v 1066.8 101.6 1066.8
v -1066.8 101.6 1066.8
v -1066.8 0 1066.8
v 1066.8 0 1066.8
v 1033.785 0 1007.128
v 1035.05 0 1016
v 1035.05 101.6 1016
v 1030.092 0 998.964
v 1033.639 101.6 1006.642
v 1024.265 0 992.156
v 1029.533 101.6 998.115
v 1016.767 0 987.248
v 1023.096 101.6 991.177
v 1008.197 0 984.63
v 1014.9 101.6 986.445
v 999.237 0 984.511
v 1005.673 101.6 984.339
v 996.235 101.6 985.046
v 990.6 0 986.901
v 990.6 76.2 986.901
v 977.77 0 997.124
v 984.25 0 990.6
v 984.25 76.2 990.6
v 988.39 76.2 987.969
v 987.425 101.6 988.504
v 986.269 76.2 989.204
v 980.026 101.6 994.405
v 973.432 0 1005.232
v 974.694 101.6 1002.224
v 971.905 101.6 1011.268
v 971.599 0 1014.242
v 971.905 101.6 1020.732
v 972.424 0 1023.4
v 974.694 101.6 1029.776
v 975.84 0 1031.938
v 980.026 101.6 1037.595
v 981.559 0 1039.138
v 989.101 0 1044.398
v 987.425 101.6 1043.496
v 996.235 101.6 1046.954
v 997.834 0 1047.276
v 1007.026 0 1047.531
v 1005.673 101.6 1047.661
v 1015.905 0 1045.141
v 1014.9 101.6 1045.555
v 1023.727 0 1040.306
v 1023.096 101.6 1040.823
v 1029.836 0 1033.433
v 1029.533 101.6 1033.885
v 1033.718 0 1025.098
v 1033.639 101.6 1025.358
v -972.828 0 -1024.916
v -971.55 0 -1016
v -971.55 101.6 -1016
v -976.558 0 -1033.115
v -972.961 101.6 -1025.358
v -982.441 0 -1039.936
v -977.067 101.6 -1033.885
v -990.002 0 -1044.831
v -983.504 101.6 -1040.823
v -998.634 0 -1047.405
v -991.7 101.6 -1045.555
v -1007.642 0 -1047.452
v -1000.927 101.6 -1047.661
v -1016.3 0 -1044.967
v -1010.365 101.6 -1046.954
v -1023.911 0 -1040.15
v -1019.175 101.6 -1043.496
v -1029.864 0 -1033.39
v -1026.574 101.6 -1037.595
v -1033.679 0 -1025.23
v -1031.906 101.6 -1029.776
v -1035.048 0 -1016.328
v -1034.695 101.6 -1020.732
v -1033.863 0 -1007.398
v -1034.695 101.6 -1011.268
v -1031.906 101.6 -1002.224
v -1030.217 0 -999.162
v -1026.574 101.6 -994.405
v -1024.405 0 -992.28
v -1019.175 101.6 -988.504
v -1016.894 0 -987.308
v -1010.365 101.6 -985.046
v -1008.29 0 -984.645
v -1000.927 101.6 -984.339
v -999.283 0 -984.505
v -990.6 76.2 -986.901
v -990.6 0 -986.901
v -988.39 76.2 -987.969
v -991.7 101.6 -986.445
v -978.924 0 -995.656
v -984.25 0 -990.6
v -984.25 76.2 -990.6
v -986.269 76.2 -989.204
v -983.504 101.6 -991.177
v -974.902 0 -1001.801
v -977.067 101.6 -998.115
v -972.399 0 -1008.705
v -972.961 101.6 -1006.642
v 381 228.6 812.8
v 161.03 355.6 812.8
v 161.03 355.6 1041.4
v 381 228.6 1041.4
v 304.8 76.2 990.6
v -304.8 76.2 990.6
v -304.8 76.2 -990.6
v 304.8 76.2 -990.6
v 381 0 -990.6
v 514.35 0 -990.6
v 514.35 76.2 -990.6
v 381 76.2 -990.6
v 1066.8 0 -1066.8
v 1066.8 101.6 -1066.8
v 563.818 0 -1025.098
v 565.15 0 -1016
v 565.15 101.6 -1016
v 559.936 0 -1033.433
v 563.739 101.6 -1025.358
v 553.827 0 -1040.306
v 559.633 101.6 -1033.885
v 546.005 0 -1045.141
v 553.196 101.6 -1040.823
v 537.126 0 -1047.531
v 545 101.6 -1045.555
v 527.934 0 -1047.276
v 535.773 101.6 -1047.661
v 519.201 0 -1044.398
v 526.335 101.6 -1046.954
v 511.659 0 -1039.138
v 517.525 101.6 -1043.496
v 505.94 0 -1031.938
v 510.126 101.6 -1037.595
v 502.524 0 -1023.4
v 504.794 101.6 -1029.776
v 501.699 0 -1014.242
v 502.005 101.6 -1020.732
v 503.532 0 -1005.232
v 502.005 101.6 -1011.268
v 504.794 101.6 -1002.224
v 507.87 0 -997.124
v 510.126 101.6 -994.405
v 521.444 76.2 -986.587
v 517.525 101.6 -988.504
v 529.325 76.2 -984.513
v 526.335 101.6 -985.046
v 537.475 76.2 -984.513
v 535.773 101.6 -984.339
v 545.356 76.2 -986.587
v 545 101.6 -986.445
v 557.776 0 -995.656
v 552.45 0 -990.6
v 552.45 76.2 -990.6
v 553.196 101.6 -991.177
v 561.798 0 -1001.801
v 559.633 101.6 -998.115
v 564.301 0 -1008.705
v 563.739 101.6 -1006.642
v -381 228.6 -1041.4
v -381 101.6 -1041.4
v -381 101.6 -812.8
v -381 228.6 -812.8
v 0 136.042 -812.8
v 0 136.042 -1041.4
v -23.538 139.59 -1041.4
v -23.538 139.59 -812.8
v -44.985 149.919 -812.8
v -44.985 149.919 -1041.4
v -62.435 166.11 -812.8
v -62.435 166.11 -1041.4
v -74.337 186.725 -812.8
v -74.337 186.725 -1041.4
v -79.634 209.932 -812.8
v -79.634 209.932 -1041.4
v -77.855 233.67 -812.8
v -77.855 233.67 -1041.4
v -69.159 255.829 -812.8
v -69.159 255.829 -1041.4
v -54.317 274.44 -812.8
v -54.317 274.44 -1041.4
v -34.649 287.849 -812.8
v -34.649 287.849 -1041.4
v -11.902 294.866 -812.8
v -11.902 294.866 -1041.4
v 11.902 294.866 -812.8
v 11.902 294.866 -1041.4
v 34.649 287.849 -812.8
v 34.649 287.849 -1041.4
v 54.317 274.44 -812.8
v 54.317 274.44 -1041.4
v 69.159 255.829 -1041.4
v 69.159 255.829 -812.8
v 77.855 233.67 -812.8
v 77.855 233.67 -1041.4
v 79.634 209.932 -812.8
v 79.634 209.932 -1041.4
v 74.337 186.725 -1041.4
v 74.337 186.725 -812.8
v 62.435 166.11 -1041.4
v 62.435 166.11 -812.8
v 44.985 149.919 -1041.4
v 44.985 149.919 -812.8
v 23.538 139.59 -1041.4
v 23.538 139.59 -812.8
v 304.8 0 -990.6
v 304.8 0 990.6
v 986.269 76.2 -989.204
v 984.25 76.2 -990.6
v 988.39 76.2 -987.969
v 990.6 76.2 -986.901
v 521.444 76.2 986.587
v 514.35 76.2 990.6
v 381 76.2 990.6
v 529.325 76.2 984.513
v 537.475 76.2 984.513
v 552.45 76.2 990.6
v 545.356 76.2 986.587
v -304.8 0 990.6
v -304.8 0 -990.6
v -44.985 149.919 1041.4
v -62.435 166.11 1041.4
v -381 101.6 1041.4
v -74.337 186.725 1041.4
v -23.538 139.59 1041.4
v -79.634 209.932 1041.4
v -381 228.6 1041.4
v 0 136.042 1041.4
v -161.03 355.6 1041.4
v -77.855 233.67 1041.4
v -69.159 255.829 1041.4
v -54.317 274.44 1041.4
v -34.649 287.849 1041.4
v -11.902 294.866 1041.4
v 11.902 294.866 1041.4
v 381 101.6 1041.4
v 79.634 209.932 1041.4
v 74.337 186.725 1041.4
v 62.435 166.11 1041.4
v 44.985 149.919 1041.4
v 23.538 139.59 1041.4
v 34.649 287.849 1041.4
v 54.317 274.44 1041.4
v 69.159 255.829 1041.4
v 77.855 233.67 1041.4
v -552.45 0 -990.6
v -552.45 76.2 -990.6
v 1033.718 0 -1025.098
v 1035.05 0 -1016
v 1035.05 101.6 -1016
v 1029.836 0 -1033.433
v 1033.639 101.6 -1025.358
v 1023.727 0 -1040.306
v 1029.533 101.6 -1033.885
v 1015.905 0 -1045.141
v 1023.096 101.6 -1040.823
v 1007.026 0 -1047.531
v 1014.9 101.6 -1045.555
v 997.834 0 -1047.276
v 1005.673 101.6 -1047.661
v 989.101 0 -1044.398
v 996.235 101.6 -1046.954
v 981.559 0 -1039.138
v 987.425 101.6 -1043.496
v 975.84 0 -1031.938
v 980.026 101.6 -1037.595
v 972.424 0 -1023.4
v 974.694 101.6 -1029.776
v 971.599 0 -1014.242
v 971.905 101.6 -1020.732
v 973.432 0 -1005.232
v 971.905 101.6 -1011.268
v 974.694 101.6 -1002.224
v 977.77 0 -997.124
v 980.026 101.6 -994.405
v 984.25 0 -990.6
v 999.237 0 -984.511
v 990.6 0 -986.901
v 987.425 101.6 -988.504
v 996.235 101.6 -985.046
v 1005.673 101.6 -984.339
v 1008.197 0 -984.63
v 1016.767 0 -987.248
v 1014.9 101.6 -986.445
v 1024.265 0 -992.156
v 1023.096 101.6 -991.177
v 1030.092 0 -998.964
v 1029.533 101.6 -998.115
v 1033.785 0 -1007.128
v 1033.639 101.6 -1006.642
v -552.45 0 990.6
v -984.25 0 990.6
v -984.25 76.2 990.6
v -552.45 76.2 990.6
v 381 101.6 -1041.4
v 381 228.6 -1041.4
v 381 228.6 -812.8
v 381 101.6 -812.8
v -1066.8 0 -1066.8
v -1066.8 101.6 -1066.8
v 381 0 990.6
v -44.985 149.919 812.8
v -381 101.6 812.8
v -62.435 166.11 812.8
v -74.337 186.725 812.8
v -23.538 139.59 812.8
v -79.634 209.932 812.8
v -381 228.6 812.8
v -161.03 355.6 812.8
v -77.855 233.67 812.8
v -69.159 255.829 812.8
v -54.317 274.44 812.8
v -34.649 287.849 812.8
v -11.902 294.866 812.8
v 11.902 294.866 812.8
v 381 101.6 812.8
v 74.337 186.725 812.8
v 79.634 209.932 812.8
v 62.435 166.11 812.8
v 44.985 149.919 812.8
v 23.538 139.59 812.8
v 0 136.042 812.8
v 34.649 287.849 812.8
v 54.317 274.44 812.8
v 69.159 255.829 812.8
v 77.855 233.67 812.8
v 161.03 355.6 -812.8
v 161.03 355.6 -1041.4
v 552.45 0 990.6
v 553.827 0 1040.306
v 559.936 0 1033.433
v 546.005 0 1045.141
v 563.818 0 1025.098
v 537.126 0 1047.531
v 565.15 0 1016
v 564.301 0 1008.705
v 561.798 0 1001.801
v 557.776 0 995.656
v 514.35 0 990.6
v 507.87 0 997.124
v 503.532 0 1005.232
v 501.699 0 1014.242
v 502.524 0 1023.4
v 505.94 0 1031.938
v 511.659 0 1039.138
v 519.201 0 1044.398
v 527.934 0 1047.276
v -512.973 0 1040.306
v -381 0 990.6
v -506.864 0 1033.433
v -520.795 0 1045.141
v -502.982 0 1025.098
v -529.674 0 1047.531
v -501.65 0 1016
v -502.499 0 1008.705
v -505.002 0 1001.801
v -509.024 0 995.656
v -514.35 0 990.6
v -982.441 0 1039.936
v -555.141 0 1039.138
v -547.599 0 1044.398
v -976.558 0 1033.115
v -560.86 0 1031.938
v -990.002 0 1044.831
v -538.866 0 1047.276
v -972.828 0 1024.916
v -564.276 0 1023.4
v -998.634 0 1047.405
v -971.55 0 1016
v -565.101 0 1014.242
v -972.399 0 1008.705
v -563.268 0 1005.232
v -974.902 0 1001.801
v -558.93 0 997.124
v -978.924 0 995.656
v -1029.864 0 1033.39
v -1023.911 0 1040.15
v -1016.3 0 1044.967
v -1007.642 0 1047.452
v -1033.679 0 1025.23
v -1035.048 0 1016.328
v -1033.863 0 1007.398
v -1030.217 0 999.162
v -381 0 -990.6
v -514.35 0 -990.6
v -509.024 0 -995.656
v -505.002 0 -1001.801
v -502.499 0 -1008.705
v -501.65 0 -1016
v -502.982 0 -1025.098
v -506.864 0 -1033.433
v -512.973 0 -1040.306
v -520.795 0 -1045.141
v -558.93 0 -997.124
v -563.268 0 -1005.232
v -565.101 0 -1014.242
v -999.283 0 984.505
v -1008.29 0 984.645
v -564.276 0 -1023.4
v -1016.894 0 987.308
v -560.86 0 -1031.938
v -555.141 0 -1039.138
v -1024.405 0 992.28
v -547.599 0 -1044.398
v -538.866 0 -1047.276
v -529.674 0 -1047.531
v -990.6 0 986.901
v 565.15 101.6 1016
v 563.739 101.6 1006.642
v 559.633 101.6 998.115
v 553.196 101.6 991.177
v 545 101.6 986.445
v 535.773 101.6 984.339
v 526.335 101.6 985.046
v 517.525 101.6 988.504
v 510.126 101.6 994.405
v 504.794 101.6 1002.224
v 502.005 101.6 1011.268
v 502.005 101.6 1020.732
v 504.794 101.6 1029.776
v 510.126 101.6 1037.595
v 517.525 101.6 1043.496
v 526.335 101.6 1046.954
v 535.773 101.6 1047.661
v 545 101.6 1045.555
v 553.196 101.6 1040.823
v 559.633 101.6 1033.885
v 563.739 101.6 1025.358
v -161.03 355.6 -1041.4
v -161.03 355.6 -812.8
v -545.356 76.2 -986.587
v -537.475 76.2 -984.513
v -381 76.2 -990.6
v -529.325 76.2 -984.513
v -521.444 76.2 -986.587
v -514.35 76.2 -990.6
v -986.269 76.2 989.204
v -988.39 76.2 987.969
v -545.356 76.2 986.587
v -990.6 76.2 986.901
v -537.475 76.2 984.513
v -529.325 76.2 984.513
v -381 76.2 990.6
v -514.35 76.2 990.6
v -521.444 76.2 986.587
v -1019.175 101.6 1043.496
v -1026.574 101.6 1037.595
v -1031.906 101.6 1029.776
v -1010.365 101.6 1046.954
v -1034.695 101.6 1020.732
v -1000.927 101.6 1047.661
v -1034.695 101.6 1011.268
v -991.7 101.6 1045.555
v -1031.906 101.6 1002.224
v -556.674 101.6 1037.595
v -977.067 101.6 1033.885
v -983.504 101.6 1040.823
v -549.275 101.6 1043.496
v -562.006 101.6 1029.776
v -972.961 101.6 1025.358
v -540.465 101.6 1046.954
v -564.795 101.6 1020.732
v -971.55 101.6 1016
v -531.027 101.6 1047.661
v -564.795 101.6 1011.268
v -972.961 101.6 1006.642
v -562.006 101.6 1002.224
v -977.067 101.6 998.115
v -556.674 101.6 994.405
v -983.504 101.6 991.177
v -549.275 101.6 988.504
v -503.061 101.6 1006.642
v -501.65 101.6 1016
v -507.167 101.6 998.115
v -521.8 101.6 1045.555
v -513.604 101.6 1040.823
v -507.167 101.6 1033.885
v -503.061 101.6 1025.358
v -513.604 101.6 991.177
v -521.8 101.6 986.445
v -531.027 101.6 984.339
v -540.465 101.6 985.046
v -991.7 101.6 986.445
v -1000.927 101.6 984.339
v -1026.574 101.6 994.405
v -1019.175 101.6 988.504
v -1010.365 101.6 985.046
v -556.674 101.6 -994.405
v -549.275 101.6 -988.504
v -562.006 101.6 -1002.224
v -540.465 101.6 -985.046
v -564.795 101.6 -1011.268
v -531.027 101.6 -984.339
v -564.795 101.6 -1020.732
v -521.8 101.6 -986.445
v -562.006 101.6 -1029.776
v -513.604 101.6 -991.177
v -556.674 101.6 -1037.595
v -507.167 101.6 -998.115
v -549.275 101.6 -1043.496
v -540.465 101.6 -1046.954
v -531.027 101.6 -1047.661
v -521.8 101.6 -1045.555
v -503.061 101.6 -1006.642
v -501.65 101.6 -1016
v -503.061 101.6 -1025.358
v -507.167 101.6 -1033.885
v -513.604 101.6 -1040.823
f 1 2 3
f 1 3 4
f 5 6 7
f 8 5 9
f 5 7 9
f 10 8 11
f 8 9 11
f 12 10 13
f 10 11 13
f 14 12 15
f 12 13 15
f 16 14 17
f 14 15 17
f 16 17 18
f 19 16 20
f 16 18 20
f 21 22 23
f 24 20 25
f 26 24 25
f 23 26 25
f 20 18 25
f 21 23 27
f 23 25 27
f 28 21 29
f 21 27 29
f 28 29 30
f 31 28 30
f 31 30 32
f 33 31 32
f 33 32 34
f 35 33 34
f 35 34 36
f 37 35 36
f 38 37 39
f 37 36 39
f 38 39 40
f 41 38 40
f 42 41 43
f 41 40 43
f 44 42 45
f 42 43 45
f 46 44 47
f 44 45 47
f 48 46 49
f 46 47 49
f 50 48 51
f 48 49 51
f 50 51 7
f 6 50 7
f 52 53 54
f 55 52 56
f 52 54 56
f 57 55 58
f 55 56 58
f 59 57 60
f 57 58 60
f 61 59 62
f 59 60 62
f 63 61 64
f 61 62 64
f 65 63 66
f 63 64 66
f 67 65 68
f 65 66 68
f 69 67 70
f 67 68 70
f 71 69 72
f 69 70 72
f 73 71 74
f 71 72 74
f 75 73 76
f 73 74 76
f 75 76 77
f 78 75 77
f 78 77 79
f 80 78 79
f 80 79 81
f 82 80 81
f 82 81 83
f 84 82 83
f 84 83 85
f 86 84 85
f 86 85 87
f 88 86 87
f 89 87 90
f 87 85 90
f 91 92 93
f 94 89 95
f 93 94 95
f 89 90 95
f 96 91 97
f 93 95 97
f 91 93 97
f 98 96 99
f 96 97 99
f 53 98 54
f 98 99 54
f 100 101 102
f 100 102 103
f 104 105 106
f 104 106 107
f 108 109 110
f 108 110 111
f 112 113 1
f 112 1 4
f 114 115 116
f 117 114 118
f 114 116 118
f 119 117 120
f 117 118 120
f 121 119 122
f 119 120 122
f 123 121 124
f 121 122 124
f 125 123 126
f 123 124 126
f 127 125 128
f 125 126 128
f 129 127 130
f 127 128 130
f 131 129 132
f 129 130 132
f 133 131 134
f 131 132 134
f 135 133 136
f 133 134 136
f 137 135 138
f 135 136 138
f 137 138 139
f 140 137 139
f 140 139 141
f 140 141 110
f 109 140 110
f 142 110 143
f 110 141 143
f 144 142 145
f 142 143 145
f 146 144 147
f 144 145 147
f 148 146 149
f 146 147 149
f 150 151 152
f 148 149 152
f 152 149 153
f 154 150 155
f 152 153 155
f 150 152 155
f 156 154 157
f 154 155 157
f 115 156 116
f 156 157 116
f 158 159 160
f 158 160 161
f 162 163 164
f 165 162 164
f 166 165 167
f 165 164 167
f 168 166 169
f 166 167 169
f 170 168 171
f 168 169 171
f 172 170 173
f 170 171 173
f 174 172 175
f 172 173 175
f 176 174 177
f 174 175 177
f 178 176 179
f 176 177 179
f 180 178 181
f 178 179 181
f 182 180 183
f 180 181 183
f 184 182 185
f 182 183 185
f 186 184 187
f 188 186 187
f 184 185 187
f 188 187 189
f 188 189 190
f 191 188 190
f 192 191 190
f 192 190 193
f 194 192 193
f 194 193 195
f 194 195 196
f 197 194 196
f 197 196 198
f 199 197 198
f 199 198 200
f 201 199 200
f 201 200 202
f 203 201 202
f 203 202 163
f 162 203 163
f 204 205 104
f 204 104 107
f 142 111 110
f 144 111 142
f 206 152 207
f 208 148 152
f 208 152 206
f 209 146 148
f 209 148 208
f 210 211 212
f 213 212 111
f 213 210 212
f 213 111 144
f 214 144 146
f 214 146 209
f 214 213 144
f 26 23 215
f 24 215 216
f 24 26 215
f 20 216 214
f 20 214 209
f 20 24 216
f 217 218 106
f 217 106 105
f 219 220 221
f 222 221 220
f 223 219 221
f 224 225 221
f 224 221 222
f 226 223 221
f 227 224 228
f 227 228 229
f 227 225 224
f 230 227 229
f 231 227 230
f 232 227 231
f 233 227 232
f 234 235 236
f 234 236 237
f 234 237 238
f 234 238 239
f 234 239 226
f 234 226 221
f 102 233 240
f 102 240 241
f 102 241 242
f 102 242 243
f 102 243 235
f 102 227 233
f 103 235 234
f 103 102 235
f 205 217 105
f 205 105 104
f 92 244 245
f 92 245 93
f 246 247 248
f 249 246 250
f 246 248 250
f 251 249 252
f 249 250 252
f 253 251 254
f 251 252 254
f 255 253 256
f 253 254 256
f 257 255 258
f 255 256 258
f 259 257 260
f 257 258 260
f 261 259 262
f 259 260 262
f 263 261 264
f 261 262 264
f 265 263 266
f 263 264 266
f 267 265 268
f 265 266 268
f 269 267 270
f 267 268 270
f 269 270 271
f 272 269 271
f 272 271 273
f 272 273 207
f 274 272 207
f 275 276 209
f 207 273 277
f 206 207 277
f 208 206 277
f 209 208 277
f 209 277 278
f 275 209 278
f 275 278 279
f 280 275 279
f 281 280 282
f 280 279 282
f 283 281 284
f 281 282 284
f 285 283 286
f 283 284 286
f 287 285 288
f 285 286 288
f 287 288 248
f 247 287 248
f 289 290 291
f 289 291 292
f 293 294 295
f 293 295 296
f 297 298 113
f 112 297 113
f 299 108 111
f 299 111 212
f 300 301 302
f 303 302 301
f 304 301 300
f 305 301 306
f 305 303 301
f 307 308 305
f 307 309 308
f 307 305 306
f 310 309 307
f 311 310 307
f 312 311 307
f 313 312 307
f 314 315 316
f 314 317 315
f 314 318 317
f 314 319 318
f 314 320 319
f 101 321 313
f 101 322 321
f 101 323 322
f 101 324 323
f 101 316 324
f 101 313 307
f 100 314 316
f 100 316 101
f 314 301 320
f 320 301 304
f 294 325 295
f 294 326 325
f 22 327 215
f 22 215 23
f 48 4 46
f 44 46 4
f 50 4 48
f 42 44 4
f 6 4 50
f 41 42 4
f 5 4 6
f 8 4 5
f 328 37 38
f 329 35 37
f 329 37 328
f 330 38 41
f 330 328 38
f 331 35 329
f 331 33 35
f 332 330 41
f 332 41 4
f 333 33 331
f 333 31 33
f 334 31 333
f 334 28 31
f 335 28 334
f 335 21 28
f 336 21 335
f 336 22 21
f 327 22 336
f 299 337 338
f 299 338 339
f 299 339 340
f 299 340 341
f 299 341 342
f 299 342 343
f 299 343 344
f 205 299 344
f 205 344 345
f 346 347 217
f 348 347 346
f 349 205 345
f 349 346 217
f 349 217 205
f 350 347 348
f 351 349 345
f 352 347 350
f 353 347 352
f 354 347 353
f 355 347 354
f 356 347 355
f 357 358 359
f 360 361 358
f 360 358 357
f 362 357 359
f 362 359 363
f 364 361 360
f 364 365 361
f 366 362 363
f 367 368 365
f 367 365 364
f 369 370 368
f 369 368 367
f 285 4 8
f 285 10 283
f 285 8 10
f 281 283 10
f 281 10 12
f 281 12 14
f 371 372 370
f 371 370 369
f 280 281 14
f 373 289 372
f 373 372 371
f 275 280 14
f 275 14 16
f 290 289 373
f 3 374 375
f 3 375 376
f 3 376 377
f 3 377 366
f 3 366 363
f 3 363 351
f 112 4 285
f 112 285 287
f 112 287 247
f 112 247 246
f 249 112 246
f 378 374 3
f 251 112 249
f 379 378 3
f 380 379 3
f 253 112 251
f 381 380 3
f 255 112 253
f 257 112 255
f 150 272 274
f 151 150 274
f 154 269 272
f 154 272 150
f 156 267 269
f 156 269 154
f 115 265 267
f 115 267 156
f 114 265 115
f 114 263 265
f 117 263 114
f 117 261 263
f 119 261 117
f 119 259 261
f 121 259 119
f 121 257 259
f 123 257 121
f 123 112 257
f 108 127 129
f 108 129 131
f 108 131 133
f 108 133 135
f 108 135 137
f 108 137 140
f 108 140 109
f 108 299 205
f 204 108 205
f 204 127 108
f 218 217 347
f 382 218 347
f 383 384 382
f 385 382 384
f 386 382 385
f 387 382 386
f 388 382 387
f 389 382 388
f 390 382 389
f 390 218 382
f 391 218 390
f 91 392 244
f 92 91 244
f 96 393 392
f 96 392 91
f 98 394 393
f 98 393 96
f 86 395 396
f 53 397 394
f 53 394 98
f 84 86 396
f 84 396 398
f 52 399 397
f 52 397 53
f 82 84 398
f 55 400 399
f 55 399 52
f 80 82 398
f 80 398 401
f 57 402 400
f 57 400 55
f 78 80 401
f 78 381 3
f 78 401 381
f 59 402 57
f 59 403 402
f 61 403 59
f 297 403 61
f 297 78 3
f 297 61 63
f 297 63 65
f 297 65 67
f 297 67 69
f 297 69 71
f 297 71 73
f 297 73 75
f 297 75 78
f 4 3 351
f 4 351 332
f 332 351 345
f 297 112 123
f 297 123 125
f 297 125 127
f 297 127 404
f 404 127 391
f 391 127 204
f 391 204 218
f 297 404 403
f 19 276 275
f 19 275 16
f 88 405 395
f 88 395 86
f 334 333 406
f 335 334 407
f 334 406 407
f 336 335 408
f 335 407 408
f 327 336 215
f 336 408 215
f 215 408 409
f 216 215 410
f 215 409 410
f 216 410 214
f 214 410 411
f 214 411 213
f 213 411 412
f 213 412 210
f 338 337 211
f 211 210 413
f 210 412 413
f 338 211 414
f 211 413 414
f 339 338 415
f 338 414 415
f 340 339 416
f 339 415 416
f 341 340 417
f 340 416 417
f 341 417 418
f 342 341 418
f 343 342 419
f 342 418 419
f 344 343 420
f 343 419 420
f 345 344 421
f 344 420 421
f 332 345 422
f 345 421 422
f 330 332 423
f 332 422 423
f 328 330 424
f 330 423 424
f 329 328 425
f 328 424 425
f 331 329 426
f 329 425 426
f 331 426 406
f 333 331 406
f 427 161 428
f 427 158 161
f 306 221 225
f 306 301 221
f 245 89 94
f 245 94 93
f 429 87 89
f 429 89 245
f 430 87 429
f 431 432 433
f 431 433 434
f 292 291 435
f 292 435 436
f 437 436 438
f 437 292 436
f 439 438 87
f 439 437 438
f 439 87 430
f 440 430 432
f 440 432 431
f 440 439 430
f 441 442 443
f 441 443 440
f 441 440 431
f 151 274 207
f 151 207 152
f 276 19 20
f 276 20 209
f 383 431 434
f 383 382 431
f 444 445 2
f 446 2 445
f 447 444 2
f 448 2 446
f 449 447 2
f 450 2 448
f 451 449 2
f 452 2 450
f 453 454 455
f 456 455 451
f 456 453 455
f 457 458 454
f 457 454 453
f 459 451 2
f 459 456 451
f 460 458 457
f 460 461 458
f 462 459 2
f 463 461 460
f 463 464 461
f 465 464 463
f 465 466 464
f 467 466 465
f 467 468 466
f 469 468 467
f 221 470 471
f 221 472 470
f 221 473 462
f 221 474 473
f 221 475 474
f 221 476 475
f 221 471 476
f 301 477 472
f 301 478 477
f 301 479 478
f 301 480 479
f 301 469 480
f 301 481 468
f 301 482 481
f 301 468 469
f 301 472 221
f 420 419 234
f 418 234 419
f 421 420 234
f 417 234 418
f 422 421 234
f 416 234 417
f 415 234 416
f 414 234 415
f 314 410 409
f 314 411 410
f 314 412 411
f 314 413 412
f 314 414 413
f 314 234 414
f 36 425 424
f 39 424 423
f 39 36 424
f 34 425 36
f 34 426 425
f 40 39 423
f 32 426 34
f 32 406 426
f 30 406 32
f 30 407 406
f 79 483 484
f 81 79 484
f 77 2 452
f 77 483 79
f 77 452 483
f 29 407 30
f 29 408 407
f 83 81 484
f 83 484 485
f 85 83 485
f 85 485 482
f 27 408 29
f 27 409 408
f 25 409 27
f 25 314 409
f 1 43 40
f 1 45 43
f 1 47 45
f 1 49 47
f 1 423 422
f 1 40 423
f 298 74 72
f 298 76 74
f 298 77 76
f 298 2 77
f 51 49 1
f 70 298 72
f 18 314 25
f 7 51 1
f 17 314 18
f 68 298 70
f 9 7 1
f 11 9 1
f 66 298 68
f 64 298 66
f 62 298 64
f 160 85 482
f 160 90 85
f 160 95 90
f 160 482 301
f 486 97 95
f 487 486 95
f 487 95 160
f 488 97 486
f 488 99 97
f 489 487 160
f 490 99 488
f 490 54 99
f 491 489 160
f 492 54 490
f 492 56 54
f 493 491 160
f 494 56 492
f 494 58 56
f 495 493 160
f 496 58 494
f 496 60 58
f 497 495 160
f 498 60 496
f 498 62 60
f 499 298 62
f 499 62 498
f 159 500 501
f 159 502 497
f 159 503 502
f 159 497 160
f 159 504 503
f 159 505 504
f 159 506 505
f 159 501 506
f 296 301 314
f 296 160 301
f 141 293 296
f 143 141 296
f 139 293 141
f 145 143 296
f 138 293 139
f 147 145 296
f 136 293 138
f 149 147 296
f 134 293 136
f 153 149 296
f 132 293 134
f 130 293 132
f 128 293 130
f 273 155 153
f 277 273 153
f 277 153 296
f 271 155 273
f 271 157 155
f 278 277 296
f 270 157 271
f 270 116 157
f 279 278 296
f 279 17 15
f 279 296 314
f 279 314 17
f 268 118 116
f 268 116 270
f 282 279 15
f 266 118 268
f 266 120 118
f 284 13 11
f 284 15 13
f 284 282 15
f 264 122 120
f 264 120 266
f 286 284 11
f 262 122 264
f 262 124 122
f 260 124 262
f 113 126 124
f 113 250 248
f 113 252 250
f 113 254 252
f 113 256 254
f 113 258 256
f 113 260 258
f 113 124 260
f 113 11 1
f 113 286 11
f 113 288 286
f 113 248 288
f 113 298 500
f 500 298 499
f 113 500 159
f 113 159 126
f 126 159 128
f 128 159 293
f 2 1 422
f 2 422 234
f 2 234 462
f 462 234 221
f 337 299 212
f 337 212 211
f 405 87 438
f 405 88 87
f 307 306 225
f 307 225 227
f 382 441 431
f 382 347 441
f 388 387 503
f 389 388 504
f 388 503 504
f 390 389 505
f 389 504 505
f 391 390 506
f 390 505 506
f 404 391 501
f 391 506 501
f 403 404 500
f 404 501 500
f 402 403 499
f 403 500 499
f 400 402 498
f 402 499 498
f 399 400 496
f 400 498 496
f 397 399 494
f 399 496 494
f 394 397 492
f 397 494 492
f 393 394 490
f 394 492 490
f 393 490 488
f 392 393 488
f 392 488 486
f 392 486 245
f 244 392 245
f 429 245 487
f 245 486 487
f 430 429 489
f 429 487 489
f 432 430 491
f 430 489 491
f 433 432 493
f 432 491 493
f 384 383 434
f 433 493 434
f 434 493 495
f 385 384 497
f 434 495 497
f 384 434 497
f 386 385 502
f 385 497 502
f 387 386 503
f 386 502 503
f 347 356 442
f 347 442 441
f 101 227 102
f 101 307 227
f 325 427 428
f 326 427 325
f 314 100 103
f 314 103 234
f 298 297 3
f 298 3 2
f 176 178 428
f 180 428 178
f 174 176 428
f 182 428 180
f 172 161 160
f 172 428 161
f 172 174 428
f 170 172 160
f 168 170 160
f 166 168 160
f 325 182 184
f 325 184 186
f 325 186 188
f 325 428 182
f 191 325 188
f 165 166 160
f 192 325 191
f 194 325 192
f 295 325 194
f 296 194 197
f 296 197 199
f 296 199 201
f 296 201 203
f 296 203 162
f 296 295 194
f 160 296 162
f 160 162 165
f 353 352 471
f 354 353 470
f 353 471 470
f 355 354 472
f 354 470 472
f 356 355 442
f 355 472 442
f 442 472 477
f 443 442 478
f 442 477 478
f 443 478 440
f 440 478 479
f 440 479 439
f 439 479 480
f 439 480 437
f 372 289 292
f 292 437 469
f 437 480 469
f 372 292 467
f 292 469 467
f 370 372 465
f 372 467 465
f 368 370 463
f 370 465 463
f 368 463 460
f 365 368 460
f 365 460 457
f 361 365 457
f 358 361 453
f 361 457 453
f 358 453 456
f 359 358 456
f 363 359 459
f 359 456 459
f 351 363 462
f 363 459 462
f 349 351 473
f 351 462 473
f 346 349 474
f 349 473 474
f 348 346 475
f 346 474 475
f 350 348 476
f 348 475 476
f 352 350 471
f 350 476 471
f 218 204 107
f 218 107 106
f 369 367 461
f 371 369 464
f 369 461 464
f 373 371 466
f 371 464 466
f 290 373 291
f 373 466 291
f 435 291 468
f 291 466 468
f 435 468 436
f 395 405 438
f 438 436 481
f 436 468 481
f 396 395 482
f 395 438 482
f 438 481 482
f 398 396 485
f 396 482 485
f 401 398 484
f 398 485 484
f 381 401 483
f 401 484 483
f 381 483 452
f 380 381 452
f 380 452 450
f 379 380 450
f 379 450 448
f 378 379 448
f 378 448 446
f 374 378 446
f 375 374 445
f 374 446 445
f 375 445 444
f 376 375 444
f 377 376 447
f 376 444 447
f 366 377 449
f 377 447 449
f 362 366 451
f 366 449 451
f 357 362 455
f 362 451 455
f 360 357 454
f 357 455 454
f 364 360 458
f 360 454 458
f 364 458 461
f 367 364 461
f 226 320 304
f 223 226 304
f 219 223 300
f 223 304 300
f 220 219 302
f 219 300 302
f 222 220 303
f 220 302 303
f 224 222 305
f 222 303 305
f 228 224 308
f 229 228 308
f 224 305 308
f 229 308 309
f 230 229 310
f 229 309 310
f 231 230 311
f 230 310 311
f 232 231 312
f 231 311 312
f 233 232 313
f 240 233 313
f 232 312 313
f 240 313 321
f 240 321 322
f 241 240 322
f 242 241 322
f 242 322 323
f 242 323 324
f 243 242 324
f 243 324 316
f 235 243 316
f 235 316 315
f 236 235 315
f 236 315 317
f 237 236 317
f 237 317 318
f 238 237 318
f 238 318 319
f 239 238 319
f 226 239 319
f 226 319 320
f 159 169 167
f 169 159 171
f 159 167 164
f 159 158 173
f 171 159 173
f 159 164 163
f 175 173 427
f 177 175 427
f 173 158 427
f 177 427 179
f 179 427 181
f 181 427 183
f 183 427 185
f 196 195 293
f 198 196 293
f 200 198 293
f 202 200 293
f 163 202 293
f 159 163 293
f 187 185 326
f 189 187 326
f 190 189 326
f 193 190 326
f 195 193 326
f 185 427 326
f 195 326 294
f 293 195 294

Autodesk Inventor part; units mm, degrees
ref_plane "YZ Plane" through (0, 0, 0) normal (1, 0, 0) x (0, 1, 0)
ref_plane "XZ Plane" through (0, 0, 0) normal (0, 1, 0) x (-1, 0, 0)
ref_plane "XY Plane" through (0, 0, 0) normal (0, 0, 1) x (1, 0, 0)
sketch "Sketch1" plane through (0, 0, 0) normal (0, 0, 1) x (1, 0, 0)
  line L0 (-1066.8, 101.6) -> (1066.8, 101.6)
  line L1 (1066.8, 101.6) -> (1066.8, 0)
  line L2 (1066.8, 0) -> (-1066.8, 0)
  line L3 (-1066.8, 0) -> (-1066.8, 101.6)
  point P0 (0, 0)
  point P1 (0, 0)
  dimension "d0" = 2133.6
  dimension "d1" = 101.6
extrude "Extrusion1" add sketch "Sketch1" along normal mid plane 2133.6
sketch "Sketch2" plane through (-1066.8, 0, 1066.8) normal (0, -1, 0) x (1, 0, 0)
  line L0 (76.2, -76.2) -> (685.8, -76.2)
  line L1 (685.8, -76.2) -> (685.8, -2057.4)
  line L2 (685.8, -2057.4) -> (76.2, -2057.4)
  line L3 (76.2, -2057.4) -> (76.2, -76.2)
  line L4 (762, -76.2) -> (1371.6, -76.2)
  line L5 (1371.6, -76.2) -> (1371.6, -2057.4)
  line L6 (1371.6, -2057.4) -> (762, -2057.4)
  line L7 (762, -2057.4) -> (762, -76.2)
  line L8 (1447.8, -76.2) -> (2057.4, -76.2)
  line L9 (2057.4, -76.2) -> (2057.4, -2057.4)
  line L10 (2057.4, -2057.4) -> (1447.8, -2057.4)
  line L11 (1447.8, -2057.4) -> (1447.8, -76.2)
  line L12 (2133.6, 0) -> (2133.6, -2133.6) construction
  line L13 (0, 0) -> (2133.6, 0) construction
  line L14 (0, 0) -> (0, -2133.6) construction
  line L15 (2133.6, -2133.6) -> (0, -2133.6) construction
  line L16 (2133.6, 0) -> (0, 0) projected
  line L17 (1066.8, 0) -> (1066.8, -1066.8) construction
  line L18 (1066.8, -1066.8) -> (2133.6, -1066.8) construction
  line L19 (2133.6, 0) -> (2133.6, -2133.6) projected
  dimension "d4" = 76.2
  dimension "d5" = 76.2
  dimension "d6" = 76.2
  dimension "d7" = 76.2
extrude "Extrusion2" cut sketch "Sketch2" against normal blind 76.2
sketch "Sketch3" plane through (-1066.8, 101.6, 1066.8) normal (0, 1, 0) x (1, 0, 0)
  line L0 (0, 2133.6) -> (2133.6, 2133.6) projected
  line L1 (0, 2133.6) -> (0, 0) projected
  circle A0 centre (63.5, 2082.8) radius 31.75
  circle A1 centre (63.5, 50.8) radius 31.75
  circle A2 centre (2070.1, 2082.8) radius 31.75
  circle A3 centre (2070.1, 50.8) radius 31.75
  circle A4 centre (533.4, 2082.8) radius 31.75
  circle A5 centre (533.4, 50.8) radius 31.75
  circle A6 centre (1600.2, 2082.8) radius 31.75
  circle A7 centre (1600.2, 50.8) radius 31.75
  point P0 (1066.8, 1066.8)
  dimension "d17" = 63.5
  dimension "d18" = 63.5
  dimension "d19" = 50.8
  dimension "d22" = 2032
  dimension "d25" = 2006.6
  dimension "d28" = 63.5
  dimension "d29" = 533.4
  dimension "d30" = 50.8
  dimension "d33" = 2032
  dimension "d36" = 1066.8
extrude "Extrusion3" cut sketch "Sketch3" against normal through all
sketch "Sketch4" plane through (0, 0, 0) normal (0, 0, 1) x (1, 0, 0)
  line L0 (1066.8, 101.6) -> (-1066.8, 101.6) projected
  line L1 (-381, 101.6) -> (-381, 228.6)
  line L2 (-381, 228.6) -> (-161.0295, 355.6)
  line L3 (-161.0295, 355.6) -> (161.0295, 355.6)
  line L4 (161.0295, 355.6) -> (381, 228.6)
  line L5 (381, 228.6) -> (381, 101.6)
  line L6 (0, 355.6) -> (0, 0) construction
  dimension "d42" = 127
  dimension "d43" = 254
  dimension "d50" = 762
  dimension "d60" = 150
extrude "Extrusion4" add sketch "Sketch4" along normal mid plane 2082.8
sketch "Sketch5" plane through (381, 101.6, 1041.4) normal (1, 0, 0) x (0, 0, -1)
  line L0 (228.6, 254) -> (1854.2, 254)
  line L1 (1854.2, 254) -> (1854.2, 0)
  line L2 (1854.2, 0) -> (228.6, 0)
  line L3 (228.6, 0) -> (228.6, 254)
  line L4 (2082.8, 254) -> (0, 254) projected
  line L5 (1041.4, -101.6) -> (1041.4, -12.4327) construction
  line L6 (0, 0) -> (2082.8, 0) projected
  dimension "d47" = 1625.6
extrude "Extrusion5" cut sketch "Sketch5" against normal through all
sketch "Sketch6" plane through (0, 0, 1041.4) normal (0, 0, 1) x (1, 0, 0)
  line L0 (0, 0) -> (0, 215.9) construction
  line L1 (-203.2, 215.9) -> (203.2, 215.9) construction
  dimension "d51" = 203.2
  dimension "d52" = 215.9
hole "Hole1" at (0, 215.9, 1041.4) direction (0, 0, -1) diameter 159.7152 end through all
properties part number "Gondola Top Frame" material "Steel, Alloy"
